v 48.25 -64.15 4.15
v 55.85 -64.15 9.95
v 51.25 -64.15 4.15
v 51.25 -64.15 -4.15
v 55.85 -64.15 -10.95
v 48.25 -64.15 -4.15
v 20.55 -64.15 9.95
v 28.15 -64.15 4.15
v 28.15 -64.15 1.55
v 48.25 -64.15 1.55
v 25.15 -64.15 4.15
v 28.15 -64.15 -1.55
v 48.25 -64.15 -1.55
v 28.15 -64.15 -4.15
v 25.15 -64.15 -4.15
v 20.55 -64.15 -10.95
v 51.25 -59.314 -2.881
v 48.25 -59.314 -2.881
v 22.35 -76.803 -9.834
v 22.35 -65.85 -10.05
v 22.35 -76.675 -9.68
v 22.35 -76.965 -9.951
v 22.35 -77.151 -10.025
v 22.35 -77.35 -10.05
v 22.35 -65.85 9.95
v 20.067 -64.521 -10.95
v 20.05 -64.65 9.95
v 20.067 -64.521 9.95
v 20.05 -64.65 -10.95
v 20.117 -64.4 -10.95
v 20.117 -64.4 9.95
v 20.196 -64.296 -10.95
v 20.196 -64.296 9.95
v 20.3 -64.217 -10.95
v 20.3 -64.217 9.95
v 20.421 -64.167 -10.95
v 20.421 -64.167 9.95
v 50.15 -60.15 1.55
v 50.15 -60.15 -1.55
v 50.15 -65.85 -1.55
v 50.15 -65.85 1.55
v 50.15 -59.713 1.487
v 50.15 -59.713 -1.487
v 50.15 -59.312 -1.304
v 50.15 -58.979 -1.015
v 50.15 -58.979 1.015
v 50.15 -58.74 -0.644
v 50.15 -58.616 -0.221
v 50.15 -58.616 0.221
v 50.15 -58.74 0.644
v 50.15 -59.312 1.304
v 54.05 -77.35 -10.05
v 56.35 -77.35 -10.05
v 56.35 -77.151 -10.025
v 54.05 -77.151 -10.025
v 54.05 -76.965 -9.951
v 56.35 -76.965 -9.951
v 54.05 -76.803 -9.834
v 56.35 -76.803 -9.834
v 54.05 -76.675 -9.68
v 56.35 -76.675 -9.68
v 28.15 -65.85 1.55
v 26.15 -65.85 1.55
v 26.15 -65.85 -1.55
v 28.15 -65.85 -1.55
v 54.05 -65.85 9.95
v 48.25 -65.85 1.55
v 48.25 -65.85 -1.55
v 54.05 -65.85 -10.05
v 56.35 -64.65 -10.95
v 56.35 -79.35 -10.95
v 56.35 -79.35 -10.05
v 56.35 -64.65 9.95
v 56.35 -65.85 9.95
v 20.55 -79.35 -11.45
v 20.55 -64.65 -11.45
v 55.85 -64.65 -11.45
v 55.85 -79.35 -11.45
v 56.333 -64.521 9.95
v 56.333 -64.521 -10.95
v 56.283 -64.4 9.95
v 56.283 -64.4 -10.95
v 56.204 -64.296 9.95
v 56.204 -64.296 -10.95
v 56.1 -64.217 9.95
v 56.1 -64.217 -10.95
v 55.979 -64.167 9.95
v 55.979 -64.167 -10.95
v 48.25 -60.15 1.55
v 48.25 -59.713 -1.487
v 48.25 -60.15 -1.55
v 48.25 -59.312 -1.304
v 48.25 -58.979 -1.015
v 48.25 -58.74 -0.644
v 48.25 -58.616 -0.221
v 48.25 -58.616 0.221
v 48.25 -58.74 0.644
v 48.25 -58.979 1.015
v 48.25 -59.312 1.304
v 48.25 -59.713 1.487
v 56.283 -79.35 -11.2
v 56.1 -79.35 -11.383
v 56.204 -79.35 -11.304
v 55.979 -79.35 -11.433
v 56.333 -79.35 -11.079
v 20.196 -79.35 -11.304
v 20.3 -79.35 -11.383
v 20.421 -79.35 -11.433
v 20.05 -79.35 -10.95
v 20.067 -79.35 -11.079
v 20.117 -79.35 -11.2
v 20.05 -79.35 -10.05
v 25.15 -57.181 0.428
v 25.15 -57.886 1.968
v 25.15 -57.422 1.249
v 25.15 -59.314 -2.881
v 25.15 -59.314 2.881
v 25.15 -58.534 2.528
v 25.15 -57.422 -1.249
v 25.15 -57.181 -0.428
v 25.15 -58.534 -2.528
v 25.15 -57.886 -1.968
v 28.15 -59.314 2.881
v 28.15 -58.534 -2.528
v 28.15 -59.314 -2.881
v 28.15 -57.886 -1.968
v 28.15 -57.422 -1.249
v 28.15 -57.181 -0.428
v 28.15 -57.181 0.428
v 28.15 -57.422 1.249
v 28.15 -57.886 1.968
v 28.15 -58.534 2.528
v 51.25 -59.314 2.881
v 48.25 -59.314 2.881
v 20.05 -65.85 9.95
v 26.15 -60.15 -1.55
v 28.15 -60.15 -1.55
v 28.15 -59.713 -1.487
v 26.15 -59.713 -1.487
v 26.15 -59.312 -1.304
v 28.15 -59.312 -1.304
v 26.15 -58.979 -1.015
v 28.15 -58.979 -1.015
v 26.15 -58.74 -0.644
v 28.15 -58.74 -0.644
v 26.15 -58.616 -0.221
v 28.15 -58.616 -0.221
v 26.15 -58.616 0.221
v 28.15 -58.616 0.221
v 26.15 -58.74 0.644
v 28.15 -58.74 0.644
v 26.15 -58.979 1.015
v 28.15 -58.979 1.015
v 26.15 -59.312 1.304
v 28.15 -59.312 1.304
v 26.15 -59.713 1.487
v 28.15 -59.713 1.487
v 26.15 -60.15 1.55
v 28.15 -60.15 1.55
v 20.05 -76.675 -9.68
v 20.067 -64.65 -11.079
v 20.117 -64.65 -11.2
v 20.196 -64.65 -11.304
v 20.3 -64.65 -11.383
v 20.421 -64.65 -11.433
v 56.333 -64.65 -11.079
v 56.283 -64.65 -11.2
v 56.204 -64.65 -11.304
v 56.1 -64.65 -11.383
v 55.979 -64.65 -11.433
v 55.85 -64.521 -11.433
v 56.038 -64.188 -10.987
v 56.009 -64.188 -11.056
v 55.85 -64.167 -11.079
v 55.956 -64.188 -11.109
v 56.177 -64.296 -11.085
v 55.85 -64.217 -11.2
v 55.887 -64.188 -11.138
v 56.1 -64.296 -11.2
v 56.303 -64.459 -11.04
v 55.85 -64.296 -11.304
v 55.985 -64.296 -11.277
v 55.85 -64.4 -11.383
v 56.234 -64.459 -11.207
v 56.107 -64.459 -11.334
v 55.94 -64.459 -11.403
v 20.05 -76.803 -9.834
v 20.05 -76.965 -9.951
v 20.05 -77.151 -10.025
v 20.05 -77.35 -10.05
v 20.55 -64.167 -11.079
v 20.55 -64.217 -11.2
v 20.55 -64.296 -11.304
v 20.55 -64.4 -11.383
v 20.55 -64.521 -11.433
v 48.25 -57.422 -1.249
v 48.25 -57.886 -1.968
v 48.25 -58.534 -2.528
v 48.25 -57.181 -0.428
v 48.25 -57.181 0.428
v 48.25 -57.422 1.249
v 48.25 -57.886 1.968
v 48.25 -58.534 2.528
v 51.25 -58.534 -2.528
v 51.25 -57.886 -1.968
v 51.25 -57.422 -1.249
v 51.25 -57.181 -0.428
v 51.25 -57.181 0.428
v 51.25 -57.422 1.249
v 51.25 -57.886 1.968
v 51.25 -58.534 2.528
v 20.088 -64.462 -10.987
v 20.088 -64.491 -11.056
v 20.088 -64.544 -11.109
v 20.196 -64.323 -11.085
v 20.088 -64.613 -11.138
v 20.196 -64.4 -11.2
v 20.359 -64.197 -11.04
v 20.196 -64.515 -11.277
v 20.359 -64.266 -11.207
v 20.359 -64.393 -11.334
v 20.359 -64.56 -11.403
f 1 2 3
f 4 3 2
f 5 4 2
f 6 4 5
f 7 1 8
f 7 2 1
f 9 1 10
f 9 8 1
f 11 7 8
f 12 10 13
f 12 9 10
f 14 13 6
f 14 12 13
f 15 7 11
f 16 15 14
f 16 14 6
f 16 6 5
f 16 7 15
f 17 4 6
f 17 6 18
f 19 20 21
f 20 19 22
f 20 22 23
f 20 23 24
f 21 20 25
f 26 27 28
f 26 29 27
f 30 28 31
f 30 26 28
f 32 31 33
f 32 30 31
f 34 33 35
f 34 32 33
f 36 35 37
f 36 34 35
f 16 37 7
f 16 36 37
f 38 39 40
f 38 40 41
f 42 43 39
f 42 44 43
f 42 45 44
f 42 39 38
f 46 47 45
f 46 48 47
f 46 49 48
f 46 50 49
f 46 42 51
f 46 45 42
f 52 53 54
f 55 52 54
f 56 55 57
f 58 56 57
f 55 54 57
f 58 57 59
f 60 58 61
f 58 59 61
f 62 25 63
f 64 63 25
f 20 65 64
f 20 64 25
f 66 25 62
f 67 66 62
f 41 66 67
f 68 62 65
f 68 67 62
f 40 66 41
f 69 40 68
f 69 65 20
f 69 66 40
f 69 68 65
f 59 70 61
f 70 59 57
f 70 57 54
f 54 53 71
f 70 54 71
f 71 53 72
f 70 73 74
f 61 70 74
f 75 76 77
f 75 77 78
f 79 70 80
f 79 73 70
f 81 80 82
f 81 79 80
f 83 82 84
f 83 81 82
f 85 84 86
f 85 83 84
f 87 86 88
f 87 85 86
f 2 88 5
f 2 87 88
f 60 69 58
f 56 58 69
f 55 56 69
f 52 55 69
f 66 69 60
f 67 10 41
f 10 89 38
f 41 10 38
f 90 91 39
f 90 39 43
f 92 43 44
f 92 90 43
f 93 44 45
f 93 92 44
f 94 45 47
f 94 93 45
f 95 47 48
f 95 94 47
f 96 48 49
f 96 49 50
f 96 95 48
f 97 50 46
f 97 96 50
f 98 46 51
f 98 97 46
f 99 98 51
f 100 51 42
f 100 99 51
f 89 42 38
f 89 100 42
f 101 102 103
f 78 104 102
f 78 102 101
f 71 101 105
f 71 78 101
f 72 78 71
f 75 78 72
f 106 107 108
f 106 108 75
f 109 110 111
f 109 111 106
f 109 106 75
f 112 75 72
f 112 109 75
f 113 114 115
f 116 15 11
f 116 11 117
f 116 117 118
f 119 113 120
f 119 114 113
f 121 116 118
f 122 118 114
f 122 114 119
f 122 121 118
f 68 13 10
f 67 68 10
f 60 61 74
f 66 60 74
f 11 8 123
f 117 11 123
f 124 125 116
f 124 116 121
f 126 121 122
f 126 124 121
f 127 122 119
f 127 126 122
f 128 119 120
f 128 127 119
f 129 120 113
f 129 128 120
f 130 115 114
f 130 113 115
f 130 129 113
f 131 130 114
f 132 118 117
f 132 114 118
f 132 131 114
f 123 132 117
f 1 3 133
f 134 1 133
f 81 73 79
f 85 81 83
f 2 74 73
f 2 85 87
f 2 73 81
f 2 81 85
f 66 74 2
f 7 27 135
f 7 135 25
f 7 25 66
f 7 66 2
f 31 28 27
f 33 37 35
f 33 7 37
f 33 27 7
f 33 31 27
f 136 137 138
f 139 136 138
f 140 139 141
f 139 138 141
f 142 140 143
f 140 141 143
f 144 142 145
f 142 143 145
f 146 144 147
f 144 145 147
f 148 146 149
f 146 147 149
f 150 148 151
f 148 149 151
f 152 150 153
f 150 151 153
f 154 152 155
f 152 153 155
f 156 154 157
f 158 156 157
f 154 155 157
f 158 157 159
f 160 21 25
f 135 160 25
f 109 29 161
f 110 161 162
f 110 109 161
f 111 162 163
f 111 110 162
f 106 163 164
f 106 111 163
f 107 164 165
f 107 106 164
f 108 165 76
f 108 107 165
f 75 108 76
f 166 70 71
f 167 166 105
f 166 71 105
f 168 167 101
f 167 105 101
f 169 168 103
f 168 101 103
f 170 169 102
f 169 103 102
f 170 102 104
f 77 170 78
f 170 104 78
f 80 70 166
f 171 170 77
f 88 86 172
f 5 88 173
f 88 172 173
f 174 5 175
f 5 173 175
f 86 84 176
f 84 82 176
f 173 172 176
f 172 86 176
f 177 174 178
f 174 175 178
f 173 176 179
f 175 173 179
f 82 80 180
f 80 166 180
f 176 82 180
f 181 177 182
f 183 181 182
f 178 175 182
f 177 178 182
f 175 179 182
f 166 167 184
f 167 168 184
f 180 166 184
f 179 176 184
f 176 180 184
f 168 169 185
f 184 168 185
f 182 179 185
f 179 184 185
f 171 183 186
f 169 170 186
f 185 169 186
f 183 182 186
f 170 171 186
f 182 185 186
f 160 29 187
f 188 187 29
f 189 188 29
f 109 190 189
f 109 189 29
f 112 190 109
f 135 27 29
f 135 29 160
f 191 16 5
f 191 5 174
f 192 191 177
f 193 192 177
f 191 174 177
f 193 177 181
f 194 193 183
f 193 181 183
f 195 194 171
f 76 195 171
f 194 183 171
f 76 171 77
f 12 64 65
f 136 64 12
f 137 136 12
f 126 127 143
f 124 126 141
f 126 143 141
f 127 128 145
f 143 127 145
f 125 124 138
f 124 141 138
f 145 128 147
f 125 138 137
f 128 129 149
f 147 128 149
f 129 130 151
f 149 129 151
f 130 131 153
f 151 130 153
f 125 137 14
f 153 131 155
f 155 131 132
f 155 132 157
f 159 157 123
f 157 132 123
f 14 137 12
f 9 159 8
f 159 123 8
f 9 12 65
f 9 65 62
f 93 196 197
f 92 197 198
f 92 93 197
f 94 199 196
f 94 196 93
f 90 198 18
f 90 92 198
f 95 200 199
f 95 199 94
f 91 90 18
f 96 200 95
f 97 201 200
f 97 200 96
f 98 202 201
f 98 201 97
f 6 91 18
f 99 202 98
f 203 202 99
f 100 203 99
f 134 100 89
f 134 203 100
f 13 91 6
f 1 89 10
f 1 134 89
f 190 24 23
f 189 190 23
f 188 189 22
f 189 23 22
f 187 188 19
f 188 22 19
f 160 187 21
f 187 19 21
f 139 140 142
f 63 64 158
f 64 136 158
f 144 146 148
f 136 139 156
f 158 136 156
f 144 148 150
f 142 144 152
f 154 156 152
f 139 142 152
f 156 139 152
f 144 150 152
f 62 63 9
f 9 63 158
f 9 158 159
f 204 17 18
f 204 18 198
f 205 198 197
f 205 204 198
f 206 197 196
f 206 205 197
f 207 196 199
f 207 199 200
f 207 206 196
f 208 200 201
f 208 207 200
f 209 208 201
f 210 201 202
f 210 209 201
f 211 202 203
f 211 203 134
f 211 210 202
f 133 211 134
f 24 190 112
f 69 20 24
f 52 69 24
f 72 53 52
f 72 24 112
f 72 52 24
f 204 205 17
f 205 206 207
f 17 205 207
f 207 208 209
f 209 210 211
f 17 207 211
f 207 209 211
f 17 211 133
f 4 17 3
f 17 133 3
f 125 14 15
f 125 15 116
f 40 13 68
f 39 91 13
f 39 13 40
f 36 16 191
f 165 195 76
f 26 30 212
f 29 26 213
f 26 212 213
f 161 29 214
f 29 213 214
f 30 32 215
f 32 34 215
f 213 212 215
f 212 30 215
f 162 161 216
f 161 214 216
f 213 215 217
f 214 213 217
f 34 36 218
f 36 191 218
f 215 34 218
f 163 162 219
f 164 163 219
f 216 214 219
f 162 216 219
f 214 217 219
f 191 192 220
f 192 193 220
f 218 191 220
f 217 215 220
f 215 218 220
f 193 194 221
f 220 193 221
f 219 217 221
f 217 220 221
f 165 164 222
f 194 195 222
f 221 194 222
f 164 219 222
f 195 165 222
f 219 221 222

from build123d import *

# Parameters (mm, degrees)
PAD144_DEPTH            = 36.3
PAD145_DEPTH            = 36.3
POCKET111_DEPTH         = 28.2
PAD146_DEPTH            = 8.1
POCKET112_DEPTH         = 5.1
POCKET113_DEPTH         = 5.1
POCKET114_DEPTH         = 2
POCKET115_DEPTH         = 22
SKETCH252_W             = 3.1
SKETCH252_H             = 1.9
SKETCH252_H_2           = 2
POCKET116_DEPTH         = 1.7
PAD147_DEPTH            = 36.3
POCKET117_DEPTH         = 34
PAD148_DEPTH            = 2.3
FILLET047_R             = 0.5
BODY021_ROLL_ANGLE      = 90
BODY021_PLACEMENT_ANGLE = 90


with BuildPart() as part:
    # Sketch248 → Pad144 (new body)
    with BuildSketch(Plane.XY):
        Polygon((0, 0), (0, 1.4), (13.5, 1.4), (13.5, 21.4), (15.2, 21.4), (15.2, 0), align=None)
    extrude(amount=PAD144_DEPTH)

    # Sketch249 (on Face8 of Pad144) → Pad145 (join)
    with BuildSketch(Plane.XY.offset(36.3)):
        with BuildLine():
            Line((15.2, 15.6), (20.036303, 14.331076))
            ThreePointArc((20.036303, 8.568924), (22.2, 11.45), (20.036303, 14.331076))
            Line((15.2, 7.3), (20.036303, 8.568924))
            Line((15.2, 7.3), (15.2, 15.6))
        make_face()
    extrude(amount=-PAD145_DEPTH)

    # Sketch249 (on Face8 of Pad144) → Pocket111 (cut)
    with BuildSketch(Plane.XY.offset(36.3)):
        with BuildLine():
            Line((15.2, 15.6), (20.036303, 14.331076))
            ThreePointArc((20.036303, 8.568924), (22.2, 11.45), (20.036303, 14.331076))
            Line((15.2, 7.3), (20.036303, 8.568924))
            Line((15.2, 7.3), (15.2, 15.6))
        make_face()
    extrude(amount=-POCKET111_DEPTH, mode=Mode.SUBTRACT)

    # Sketch249 (on Face8 of Pad144) → Pad146 (join)
    with BuildSketch(Plane.XY.offset(36.3)):
        with BuildLine():
            Line((15.2, 15.6), (20.036303, 14.331076))
            ThreePointArc((20.036303, 8.568924), (22.2, 11.45), (20.036303, 14.331076))
            Line((15.2, 7.3), (20.036303, 8.568924))
            Line((15.2, 7.3), (15.2, 15.6))
        make_face()
    extrude(amount=-PAD146_DEPTH)

    # Sketch249 (on Face8 of Pad144) → Pocket112 (cut)
    with BuildSketch(Plane.XY.offset(36.3)):
        with BuildLine():
            Line((15.2, 15.6), (20.036303, 14.331076))
            ThreePointArc((20.036303, 8.568924), (22.2, 11.45), (20.036303, 14.331076))
            Line((15.2, 7.3), (20.036303, 8.568924))
            Line((15.2, 7.3), (15.2, 15.6))
        make_face()
    extrude(amount=-POCKET112_DEPTH, mode=Mode.SUBTRACT)

    # Sketch250 (on Face4 of Pocket112) → Pocket113 (cut)
    with BuildSketch(Plane(origin=(0, 0, 0), x_dir=(1, 0, 0), z_dir=(0, 0, -1))):
        with BuildLine():
            Line((20.036303, -8.568924), (15.2, -7.3))
            Line((15.2, -7.3), (15.2, -15.6))
            Line((15.2, -15.6), (20.036303, -14.331076))
            ThreePointArc((20.036303, -14.331076), (22.2, -11.45), (20.036303, -8.568924))
        make_face()
    extrude(amount=-POCKET113_DEPTH, mode=Mode.SUBTRACT)

    # Sketch251 (on Face15 of Pocket113) → Pocket114 (cut)
    with BuildSketch(Plane.XY.offset(8.1)):
        with BuildLine():
            ThreePointArc((19.2, 9.9), (20.75, 11.45), (19.2, 13))
            Line((19.2, 13), (15.2, 13))
            Line((15.2, 9.9), (15.2, 13))
            Line((19.2, 9.9), (15.2, 9.9))
        make_face()
    extrude(amount=-POCKET114_DEPTH, mode=Mode.SUBTRACT)

    # Sketch251 (on Face15 of Pocket113) → Pocket115 (cut)
    with BuildSketch(Plane.XY.offset(8.1)):
        with BuildLine():
            ThreePointArc((19.2, 9.9), (20.75, 11.45), (19.2, 13))
            Line((19.2, 13), (15.2, 13))
            Line((15.2, 9.9), (15.2, 13))
            Line((19.2, 9.9), (15.2, 9.9))
        make_face()
    extrude(amount=POCKET115_DEPTH, mode=Mode.SUBTRACT)

    # Sketch252 (on Face8 of Pocket115) → Pocket116 (cut)
    with BuildSketch(Plane.YZ.offset(15.2)):
        with Locations((11.45, 29.15)):
            Rectangle(SKETCH252_W, SKETCH252_H)
        with Locations((11.45, 7.1)):
            Rectangle(SKETCH252_W, SKETCH252_H_2)
    extrude(amount=-POCKET116_DEPTH, mode=Mode.SUBTRACT)

    # Sketch253 (on Face5 of Pocket116) → Pad147 (join)
    with BuildSketch(Plane.XY.offset(36.3)):
        with BuildLine():
            Line((13.5, 21.4), (13.5, 1.4))
            Line((13.5, 1.4), (2, 1.4))
            ThreePointArc((2, 1.4), (2.384708, 1.498573), (2.674611, 1.77))
            Line((2.674611, 1.77), (13.5, 21.4))
        make_face()
    extrude(amount=-PAD147_DEPTH)

    # Sketch253 (on Face5 of Pocket116) → Pocket117 (cut)
    with BuildSketch(Plane.XY.offset(36.3)):
        with BuildLine():
            Line((13.5, 21.4), (13.5, 1.4))
            Line((13.5, 1.4), (2, 1.4))
            ThreePointArc((2, 1.4), (2.384708, 1.498573), (2.674611, 1.77))
            Line((2.674611, 1.77), (13.5, 21.4))
        make_face()
    extrude(amount=-POCKET117_DEPTH, mode=Mode.SUBTRACT)

    # Sketch253 (on Face5 of Pocket116) → Pad148 (join)
    with BuildSketch(Plane.XY.offset(36.3)):
        with BuildLine():
            Line((13.5, 21.4), (13.5, 1.4))
            Line((13.5, 1.4), (2, 1.4))
            ThreePointArc((2, 1.4), (2.384708, 1.498573), (2.674611, 1.77))
            Line((2.674611, 1.77), (13.5, 21.4))
        make_face()
    extrude(amount=-PAD148_DEPTH)

    # Fillet047
    fillet047_edges = [part.edges().sort_by_distance(p)[0] for p in [
        (7.6, 0, 36.3),
        (15.2, 10.7, 36.3),
        (15.2, 0, 18.15),
        (15.2, 10.7, 0),
        (7.6, 0, 0),
    ]]
    fillet(fillet047_edges, radius=FILLET047_R)


with BuildPart() as part_1:
    # Body021 roll: moved
    add(part.part.rotate(Axis((0, 0, 0), (1, 0, 0)), BODY021_ROLL_ANGLE))


with BuildPart() as part_2:
    # Body021 placement: moved
    add(part_1.part.moved(Location((20.05, -79.35, -11.45))).rotate(Axis((20.05, -79.35, -11.45), (0, 0, 1)), BODY021_PLACEMENT_ANGLE))


solid = part_2.part
